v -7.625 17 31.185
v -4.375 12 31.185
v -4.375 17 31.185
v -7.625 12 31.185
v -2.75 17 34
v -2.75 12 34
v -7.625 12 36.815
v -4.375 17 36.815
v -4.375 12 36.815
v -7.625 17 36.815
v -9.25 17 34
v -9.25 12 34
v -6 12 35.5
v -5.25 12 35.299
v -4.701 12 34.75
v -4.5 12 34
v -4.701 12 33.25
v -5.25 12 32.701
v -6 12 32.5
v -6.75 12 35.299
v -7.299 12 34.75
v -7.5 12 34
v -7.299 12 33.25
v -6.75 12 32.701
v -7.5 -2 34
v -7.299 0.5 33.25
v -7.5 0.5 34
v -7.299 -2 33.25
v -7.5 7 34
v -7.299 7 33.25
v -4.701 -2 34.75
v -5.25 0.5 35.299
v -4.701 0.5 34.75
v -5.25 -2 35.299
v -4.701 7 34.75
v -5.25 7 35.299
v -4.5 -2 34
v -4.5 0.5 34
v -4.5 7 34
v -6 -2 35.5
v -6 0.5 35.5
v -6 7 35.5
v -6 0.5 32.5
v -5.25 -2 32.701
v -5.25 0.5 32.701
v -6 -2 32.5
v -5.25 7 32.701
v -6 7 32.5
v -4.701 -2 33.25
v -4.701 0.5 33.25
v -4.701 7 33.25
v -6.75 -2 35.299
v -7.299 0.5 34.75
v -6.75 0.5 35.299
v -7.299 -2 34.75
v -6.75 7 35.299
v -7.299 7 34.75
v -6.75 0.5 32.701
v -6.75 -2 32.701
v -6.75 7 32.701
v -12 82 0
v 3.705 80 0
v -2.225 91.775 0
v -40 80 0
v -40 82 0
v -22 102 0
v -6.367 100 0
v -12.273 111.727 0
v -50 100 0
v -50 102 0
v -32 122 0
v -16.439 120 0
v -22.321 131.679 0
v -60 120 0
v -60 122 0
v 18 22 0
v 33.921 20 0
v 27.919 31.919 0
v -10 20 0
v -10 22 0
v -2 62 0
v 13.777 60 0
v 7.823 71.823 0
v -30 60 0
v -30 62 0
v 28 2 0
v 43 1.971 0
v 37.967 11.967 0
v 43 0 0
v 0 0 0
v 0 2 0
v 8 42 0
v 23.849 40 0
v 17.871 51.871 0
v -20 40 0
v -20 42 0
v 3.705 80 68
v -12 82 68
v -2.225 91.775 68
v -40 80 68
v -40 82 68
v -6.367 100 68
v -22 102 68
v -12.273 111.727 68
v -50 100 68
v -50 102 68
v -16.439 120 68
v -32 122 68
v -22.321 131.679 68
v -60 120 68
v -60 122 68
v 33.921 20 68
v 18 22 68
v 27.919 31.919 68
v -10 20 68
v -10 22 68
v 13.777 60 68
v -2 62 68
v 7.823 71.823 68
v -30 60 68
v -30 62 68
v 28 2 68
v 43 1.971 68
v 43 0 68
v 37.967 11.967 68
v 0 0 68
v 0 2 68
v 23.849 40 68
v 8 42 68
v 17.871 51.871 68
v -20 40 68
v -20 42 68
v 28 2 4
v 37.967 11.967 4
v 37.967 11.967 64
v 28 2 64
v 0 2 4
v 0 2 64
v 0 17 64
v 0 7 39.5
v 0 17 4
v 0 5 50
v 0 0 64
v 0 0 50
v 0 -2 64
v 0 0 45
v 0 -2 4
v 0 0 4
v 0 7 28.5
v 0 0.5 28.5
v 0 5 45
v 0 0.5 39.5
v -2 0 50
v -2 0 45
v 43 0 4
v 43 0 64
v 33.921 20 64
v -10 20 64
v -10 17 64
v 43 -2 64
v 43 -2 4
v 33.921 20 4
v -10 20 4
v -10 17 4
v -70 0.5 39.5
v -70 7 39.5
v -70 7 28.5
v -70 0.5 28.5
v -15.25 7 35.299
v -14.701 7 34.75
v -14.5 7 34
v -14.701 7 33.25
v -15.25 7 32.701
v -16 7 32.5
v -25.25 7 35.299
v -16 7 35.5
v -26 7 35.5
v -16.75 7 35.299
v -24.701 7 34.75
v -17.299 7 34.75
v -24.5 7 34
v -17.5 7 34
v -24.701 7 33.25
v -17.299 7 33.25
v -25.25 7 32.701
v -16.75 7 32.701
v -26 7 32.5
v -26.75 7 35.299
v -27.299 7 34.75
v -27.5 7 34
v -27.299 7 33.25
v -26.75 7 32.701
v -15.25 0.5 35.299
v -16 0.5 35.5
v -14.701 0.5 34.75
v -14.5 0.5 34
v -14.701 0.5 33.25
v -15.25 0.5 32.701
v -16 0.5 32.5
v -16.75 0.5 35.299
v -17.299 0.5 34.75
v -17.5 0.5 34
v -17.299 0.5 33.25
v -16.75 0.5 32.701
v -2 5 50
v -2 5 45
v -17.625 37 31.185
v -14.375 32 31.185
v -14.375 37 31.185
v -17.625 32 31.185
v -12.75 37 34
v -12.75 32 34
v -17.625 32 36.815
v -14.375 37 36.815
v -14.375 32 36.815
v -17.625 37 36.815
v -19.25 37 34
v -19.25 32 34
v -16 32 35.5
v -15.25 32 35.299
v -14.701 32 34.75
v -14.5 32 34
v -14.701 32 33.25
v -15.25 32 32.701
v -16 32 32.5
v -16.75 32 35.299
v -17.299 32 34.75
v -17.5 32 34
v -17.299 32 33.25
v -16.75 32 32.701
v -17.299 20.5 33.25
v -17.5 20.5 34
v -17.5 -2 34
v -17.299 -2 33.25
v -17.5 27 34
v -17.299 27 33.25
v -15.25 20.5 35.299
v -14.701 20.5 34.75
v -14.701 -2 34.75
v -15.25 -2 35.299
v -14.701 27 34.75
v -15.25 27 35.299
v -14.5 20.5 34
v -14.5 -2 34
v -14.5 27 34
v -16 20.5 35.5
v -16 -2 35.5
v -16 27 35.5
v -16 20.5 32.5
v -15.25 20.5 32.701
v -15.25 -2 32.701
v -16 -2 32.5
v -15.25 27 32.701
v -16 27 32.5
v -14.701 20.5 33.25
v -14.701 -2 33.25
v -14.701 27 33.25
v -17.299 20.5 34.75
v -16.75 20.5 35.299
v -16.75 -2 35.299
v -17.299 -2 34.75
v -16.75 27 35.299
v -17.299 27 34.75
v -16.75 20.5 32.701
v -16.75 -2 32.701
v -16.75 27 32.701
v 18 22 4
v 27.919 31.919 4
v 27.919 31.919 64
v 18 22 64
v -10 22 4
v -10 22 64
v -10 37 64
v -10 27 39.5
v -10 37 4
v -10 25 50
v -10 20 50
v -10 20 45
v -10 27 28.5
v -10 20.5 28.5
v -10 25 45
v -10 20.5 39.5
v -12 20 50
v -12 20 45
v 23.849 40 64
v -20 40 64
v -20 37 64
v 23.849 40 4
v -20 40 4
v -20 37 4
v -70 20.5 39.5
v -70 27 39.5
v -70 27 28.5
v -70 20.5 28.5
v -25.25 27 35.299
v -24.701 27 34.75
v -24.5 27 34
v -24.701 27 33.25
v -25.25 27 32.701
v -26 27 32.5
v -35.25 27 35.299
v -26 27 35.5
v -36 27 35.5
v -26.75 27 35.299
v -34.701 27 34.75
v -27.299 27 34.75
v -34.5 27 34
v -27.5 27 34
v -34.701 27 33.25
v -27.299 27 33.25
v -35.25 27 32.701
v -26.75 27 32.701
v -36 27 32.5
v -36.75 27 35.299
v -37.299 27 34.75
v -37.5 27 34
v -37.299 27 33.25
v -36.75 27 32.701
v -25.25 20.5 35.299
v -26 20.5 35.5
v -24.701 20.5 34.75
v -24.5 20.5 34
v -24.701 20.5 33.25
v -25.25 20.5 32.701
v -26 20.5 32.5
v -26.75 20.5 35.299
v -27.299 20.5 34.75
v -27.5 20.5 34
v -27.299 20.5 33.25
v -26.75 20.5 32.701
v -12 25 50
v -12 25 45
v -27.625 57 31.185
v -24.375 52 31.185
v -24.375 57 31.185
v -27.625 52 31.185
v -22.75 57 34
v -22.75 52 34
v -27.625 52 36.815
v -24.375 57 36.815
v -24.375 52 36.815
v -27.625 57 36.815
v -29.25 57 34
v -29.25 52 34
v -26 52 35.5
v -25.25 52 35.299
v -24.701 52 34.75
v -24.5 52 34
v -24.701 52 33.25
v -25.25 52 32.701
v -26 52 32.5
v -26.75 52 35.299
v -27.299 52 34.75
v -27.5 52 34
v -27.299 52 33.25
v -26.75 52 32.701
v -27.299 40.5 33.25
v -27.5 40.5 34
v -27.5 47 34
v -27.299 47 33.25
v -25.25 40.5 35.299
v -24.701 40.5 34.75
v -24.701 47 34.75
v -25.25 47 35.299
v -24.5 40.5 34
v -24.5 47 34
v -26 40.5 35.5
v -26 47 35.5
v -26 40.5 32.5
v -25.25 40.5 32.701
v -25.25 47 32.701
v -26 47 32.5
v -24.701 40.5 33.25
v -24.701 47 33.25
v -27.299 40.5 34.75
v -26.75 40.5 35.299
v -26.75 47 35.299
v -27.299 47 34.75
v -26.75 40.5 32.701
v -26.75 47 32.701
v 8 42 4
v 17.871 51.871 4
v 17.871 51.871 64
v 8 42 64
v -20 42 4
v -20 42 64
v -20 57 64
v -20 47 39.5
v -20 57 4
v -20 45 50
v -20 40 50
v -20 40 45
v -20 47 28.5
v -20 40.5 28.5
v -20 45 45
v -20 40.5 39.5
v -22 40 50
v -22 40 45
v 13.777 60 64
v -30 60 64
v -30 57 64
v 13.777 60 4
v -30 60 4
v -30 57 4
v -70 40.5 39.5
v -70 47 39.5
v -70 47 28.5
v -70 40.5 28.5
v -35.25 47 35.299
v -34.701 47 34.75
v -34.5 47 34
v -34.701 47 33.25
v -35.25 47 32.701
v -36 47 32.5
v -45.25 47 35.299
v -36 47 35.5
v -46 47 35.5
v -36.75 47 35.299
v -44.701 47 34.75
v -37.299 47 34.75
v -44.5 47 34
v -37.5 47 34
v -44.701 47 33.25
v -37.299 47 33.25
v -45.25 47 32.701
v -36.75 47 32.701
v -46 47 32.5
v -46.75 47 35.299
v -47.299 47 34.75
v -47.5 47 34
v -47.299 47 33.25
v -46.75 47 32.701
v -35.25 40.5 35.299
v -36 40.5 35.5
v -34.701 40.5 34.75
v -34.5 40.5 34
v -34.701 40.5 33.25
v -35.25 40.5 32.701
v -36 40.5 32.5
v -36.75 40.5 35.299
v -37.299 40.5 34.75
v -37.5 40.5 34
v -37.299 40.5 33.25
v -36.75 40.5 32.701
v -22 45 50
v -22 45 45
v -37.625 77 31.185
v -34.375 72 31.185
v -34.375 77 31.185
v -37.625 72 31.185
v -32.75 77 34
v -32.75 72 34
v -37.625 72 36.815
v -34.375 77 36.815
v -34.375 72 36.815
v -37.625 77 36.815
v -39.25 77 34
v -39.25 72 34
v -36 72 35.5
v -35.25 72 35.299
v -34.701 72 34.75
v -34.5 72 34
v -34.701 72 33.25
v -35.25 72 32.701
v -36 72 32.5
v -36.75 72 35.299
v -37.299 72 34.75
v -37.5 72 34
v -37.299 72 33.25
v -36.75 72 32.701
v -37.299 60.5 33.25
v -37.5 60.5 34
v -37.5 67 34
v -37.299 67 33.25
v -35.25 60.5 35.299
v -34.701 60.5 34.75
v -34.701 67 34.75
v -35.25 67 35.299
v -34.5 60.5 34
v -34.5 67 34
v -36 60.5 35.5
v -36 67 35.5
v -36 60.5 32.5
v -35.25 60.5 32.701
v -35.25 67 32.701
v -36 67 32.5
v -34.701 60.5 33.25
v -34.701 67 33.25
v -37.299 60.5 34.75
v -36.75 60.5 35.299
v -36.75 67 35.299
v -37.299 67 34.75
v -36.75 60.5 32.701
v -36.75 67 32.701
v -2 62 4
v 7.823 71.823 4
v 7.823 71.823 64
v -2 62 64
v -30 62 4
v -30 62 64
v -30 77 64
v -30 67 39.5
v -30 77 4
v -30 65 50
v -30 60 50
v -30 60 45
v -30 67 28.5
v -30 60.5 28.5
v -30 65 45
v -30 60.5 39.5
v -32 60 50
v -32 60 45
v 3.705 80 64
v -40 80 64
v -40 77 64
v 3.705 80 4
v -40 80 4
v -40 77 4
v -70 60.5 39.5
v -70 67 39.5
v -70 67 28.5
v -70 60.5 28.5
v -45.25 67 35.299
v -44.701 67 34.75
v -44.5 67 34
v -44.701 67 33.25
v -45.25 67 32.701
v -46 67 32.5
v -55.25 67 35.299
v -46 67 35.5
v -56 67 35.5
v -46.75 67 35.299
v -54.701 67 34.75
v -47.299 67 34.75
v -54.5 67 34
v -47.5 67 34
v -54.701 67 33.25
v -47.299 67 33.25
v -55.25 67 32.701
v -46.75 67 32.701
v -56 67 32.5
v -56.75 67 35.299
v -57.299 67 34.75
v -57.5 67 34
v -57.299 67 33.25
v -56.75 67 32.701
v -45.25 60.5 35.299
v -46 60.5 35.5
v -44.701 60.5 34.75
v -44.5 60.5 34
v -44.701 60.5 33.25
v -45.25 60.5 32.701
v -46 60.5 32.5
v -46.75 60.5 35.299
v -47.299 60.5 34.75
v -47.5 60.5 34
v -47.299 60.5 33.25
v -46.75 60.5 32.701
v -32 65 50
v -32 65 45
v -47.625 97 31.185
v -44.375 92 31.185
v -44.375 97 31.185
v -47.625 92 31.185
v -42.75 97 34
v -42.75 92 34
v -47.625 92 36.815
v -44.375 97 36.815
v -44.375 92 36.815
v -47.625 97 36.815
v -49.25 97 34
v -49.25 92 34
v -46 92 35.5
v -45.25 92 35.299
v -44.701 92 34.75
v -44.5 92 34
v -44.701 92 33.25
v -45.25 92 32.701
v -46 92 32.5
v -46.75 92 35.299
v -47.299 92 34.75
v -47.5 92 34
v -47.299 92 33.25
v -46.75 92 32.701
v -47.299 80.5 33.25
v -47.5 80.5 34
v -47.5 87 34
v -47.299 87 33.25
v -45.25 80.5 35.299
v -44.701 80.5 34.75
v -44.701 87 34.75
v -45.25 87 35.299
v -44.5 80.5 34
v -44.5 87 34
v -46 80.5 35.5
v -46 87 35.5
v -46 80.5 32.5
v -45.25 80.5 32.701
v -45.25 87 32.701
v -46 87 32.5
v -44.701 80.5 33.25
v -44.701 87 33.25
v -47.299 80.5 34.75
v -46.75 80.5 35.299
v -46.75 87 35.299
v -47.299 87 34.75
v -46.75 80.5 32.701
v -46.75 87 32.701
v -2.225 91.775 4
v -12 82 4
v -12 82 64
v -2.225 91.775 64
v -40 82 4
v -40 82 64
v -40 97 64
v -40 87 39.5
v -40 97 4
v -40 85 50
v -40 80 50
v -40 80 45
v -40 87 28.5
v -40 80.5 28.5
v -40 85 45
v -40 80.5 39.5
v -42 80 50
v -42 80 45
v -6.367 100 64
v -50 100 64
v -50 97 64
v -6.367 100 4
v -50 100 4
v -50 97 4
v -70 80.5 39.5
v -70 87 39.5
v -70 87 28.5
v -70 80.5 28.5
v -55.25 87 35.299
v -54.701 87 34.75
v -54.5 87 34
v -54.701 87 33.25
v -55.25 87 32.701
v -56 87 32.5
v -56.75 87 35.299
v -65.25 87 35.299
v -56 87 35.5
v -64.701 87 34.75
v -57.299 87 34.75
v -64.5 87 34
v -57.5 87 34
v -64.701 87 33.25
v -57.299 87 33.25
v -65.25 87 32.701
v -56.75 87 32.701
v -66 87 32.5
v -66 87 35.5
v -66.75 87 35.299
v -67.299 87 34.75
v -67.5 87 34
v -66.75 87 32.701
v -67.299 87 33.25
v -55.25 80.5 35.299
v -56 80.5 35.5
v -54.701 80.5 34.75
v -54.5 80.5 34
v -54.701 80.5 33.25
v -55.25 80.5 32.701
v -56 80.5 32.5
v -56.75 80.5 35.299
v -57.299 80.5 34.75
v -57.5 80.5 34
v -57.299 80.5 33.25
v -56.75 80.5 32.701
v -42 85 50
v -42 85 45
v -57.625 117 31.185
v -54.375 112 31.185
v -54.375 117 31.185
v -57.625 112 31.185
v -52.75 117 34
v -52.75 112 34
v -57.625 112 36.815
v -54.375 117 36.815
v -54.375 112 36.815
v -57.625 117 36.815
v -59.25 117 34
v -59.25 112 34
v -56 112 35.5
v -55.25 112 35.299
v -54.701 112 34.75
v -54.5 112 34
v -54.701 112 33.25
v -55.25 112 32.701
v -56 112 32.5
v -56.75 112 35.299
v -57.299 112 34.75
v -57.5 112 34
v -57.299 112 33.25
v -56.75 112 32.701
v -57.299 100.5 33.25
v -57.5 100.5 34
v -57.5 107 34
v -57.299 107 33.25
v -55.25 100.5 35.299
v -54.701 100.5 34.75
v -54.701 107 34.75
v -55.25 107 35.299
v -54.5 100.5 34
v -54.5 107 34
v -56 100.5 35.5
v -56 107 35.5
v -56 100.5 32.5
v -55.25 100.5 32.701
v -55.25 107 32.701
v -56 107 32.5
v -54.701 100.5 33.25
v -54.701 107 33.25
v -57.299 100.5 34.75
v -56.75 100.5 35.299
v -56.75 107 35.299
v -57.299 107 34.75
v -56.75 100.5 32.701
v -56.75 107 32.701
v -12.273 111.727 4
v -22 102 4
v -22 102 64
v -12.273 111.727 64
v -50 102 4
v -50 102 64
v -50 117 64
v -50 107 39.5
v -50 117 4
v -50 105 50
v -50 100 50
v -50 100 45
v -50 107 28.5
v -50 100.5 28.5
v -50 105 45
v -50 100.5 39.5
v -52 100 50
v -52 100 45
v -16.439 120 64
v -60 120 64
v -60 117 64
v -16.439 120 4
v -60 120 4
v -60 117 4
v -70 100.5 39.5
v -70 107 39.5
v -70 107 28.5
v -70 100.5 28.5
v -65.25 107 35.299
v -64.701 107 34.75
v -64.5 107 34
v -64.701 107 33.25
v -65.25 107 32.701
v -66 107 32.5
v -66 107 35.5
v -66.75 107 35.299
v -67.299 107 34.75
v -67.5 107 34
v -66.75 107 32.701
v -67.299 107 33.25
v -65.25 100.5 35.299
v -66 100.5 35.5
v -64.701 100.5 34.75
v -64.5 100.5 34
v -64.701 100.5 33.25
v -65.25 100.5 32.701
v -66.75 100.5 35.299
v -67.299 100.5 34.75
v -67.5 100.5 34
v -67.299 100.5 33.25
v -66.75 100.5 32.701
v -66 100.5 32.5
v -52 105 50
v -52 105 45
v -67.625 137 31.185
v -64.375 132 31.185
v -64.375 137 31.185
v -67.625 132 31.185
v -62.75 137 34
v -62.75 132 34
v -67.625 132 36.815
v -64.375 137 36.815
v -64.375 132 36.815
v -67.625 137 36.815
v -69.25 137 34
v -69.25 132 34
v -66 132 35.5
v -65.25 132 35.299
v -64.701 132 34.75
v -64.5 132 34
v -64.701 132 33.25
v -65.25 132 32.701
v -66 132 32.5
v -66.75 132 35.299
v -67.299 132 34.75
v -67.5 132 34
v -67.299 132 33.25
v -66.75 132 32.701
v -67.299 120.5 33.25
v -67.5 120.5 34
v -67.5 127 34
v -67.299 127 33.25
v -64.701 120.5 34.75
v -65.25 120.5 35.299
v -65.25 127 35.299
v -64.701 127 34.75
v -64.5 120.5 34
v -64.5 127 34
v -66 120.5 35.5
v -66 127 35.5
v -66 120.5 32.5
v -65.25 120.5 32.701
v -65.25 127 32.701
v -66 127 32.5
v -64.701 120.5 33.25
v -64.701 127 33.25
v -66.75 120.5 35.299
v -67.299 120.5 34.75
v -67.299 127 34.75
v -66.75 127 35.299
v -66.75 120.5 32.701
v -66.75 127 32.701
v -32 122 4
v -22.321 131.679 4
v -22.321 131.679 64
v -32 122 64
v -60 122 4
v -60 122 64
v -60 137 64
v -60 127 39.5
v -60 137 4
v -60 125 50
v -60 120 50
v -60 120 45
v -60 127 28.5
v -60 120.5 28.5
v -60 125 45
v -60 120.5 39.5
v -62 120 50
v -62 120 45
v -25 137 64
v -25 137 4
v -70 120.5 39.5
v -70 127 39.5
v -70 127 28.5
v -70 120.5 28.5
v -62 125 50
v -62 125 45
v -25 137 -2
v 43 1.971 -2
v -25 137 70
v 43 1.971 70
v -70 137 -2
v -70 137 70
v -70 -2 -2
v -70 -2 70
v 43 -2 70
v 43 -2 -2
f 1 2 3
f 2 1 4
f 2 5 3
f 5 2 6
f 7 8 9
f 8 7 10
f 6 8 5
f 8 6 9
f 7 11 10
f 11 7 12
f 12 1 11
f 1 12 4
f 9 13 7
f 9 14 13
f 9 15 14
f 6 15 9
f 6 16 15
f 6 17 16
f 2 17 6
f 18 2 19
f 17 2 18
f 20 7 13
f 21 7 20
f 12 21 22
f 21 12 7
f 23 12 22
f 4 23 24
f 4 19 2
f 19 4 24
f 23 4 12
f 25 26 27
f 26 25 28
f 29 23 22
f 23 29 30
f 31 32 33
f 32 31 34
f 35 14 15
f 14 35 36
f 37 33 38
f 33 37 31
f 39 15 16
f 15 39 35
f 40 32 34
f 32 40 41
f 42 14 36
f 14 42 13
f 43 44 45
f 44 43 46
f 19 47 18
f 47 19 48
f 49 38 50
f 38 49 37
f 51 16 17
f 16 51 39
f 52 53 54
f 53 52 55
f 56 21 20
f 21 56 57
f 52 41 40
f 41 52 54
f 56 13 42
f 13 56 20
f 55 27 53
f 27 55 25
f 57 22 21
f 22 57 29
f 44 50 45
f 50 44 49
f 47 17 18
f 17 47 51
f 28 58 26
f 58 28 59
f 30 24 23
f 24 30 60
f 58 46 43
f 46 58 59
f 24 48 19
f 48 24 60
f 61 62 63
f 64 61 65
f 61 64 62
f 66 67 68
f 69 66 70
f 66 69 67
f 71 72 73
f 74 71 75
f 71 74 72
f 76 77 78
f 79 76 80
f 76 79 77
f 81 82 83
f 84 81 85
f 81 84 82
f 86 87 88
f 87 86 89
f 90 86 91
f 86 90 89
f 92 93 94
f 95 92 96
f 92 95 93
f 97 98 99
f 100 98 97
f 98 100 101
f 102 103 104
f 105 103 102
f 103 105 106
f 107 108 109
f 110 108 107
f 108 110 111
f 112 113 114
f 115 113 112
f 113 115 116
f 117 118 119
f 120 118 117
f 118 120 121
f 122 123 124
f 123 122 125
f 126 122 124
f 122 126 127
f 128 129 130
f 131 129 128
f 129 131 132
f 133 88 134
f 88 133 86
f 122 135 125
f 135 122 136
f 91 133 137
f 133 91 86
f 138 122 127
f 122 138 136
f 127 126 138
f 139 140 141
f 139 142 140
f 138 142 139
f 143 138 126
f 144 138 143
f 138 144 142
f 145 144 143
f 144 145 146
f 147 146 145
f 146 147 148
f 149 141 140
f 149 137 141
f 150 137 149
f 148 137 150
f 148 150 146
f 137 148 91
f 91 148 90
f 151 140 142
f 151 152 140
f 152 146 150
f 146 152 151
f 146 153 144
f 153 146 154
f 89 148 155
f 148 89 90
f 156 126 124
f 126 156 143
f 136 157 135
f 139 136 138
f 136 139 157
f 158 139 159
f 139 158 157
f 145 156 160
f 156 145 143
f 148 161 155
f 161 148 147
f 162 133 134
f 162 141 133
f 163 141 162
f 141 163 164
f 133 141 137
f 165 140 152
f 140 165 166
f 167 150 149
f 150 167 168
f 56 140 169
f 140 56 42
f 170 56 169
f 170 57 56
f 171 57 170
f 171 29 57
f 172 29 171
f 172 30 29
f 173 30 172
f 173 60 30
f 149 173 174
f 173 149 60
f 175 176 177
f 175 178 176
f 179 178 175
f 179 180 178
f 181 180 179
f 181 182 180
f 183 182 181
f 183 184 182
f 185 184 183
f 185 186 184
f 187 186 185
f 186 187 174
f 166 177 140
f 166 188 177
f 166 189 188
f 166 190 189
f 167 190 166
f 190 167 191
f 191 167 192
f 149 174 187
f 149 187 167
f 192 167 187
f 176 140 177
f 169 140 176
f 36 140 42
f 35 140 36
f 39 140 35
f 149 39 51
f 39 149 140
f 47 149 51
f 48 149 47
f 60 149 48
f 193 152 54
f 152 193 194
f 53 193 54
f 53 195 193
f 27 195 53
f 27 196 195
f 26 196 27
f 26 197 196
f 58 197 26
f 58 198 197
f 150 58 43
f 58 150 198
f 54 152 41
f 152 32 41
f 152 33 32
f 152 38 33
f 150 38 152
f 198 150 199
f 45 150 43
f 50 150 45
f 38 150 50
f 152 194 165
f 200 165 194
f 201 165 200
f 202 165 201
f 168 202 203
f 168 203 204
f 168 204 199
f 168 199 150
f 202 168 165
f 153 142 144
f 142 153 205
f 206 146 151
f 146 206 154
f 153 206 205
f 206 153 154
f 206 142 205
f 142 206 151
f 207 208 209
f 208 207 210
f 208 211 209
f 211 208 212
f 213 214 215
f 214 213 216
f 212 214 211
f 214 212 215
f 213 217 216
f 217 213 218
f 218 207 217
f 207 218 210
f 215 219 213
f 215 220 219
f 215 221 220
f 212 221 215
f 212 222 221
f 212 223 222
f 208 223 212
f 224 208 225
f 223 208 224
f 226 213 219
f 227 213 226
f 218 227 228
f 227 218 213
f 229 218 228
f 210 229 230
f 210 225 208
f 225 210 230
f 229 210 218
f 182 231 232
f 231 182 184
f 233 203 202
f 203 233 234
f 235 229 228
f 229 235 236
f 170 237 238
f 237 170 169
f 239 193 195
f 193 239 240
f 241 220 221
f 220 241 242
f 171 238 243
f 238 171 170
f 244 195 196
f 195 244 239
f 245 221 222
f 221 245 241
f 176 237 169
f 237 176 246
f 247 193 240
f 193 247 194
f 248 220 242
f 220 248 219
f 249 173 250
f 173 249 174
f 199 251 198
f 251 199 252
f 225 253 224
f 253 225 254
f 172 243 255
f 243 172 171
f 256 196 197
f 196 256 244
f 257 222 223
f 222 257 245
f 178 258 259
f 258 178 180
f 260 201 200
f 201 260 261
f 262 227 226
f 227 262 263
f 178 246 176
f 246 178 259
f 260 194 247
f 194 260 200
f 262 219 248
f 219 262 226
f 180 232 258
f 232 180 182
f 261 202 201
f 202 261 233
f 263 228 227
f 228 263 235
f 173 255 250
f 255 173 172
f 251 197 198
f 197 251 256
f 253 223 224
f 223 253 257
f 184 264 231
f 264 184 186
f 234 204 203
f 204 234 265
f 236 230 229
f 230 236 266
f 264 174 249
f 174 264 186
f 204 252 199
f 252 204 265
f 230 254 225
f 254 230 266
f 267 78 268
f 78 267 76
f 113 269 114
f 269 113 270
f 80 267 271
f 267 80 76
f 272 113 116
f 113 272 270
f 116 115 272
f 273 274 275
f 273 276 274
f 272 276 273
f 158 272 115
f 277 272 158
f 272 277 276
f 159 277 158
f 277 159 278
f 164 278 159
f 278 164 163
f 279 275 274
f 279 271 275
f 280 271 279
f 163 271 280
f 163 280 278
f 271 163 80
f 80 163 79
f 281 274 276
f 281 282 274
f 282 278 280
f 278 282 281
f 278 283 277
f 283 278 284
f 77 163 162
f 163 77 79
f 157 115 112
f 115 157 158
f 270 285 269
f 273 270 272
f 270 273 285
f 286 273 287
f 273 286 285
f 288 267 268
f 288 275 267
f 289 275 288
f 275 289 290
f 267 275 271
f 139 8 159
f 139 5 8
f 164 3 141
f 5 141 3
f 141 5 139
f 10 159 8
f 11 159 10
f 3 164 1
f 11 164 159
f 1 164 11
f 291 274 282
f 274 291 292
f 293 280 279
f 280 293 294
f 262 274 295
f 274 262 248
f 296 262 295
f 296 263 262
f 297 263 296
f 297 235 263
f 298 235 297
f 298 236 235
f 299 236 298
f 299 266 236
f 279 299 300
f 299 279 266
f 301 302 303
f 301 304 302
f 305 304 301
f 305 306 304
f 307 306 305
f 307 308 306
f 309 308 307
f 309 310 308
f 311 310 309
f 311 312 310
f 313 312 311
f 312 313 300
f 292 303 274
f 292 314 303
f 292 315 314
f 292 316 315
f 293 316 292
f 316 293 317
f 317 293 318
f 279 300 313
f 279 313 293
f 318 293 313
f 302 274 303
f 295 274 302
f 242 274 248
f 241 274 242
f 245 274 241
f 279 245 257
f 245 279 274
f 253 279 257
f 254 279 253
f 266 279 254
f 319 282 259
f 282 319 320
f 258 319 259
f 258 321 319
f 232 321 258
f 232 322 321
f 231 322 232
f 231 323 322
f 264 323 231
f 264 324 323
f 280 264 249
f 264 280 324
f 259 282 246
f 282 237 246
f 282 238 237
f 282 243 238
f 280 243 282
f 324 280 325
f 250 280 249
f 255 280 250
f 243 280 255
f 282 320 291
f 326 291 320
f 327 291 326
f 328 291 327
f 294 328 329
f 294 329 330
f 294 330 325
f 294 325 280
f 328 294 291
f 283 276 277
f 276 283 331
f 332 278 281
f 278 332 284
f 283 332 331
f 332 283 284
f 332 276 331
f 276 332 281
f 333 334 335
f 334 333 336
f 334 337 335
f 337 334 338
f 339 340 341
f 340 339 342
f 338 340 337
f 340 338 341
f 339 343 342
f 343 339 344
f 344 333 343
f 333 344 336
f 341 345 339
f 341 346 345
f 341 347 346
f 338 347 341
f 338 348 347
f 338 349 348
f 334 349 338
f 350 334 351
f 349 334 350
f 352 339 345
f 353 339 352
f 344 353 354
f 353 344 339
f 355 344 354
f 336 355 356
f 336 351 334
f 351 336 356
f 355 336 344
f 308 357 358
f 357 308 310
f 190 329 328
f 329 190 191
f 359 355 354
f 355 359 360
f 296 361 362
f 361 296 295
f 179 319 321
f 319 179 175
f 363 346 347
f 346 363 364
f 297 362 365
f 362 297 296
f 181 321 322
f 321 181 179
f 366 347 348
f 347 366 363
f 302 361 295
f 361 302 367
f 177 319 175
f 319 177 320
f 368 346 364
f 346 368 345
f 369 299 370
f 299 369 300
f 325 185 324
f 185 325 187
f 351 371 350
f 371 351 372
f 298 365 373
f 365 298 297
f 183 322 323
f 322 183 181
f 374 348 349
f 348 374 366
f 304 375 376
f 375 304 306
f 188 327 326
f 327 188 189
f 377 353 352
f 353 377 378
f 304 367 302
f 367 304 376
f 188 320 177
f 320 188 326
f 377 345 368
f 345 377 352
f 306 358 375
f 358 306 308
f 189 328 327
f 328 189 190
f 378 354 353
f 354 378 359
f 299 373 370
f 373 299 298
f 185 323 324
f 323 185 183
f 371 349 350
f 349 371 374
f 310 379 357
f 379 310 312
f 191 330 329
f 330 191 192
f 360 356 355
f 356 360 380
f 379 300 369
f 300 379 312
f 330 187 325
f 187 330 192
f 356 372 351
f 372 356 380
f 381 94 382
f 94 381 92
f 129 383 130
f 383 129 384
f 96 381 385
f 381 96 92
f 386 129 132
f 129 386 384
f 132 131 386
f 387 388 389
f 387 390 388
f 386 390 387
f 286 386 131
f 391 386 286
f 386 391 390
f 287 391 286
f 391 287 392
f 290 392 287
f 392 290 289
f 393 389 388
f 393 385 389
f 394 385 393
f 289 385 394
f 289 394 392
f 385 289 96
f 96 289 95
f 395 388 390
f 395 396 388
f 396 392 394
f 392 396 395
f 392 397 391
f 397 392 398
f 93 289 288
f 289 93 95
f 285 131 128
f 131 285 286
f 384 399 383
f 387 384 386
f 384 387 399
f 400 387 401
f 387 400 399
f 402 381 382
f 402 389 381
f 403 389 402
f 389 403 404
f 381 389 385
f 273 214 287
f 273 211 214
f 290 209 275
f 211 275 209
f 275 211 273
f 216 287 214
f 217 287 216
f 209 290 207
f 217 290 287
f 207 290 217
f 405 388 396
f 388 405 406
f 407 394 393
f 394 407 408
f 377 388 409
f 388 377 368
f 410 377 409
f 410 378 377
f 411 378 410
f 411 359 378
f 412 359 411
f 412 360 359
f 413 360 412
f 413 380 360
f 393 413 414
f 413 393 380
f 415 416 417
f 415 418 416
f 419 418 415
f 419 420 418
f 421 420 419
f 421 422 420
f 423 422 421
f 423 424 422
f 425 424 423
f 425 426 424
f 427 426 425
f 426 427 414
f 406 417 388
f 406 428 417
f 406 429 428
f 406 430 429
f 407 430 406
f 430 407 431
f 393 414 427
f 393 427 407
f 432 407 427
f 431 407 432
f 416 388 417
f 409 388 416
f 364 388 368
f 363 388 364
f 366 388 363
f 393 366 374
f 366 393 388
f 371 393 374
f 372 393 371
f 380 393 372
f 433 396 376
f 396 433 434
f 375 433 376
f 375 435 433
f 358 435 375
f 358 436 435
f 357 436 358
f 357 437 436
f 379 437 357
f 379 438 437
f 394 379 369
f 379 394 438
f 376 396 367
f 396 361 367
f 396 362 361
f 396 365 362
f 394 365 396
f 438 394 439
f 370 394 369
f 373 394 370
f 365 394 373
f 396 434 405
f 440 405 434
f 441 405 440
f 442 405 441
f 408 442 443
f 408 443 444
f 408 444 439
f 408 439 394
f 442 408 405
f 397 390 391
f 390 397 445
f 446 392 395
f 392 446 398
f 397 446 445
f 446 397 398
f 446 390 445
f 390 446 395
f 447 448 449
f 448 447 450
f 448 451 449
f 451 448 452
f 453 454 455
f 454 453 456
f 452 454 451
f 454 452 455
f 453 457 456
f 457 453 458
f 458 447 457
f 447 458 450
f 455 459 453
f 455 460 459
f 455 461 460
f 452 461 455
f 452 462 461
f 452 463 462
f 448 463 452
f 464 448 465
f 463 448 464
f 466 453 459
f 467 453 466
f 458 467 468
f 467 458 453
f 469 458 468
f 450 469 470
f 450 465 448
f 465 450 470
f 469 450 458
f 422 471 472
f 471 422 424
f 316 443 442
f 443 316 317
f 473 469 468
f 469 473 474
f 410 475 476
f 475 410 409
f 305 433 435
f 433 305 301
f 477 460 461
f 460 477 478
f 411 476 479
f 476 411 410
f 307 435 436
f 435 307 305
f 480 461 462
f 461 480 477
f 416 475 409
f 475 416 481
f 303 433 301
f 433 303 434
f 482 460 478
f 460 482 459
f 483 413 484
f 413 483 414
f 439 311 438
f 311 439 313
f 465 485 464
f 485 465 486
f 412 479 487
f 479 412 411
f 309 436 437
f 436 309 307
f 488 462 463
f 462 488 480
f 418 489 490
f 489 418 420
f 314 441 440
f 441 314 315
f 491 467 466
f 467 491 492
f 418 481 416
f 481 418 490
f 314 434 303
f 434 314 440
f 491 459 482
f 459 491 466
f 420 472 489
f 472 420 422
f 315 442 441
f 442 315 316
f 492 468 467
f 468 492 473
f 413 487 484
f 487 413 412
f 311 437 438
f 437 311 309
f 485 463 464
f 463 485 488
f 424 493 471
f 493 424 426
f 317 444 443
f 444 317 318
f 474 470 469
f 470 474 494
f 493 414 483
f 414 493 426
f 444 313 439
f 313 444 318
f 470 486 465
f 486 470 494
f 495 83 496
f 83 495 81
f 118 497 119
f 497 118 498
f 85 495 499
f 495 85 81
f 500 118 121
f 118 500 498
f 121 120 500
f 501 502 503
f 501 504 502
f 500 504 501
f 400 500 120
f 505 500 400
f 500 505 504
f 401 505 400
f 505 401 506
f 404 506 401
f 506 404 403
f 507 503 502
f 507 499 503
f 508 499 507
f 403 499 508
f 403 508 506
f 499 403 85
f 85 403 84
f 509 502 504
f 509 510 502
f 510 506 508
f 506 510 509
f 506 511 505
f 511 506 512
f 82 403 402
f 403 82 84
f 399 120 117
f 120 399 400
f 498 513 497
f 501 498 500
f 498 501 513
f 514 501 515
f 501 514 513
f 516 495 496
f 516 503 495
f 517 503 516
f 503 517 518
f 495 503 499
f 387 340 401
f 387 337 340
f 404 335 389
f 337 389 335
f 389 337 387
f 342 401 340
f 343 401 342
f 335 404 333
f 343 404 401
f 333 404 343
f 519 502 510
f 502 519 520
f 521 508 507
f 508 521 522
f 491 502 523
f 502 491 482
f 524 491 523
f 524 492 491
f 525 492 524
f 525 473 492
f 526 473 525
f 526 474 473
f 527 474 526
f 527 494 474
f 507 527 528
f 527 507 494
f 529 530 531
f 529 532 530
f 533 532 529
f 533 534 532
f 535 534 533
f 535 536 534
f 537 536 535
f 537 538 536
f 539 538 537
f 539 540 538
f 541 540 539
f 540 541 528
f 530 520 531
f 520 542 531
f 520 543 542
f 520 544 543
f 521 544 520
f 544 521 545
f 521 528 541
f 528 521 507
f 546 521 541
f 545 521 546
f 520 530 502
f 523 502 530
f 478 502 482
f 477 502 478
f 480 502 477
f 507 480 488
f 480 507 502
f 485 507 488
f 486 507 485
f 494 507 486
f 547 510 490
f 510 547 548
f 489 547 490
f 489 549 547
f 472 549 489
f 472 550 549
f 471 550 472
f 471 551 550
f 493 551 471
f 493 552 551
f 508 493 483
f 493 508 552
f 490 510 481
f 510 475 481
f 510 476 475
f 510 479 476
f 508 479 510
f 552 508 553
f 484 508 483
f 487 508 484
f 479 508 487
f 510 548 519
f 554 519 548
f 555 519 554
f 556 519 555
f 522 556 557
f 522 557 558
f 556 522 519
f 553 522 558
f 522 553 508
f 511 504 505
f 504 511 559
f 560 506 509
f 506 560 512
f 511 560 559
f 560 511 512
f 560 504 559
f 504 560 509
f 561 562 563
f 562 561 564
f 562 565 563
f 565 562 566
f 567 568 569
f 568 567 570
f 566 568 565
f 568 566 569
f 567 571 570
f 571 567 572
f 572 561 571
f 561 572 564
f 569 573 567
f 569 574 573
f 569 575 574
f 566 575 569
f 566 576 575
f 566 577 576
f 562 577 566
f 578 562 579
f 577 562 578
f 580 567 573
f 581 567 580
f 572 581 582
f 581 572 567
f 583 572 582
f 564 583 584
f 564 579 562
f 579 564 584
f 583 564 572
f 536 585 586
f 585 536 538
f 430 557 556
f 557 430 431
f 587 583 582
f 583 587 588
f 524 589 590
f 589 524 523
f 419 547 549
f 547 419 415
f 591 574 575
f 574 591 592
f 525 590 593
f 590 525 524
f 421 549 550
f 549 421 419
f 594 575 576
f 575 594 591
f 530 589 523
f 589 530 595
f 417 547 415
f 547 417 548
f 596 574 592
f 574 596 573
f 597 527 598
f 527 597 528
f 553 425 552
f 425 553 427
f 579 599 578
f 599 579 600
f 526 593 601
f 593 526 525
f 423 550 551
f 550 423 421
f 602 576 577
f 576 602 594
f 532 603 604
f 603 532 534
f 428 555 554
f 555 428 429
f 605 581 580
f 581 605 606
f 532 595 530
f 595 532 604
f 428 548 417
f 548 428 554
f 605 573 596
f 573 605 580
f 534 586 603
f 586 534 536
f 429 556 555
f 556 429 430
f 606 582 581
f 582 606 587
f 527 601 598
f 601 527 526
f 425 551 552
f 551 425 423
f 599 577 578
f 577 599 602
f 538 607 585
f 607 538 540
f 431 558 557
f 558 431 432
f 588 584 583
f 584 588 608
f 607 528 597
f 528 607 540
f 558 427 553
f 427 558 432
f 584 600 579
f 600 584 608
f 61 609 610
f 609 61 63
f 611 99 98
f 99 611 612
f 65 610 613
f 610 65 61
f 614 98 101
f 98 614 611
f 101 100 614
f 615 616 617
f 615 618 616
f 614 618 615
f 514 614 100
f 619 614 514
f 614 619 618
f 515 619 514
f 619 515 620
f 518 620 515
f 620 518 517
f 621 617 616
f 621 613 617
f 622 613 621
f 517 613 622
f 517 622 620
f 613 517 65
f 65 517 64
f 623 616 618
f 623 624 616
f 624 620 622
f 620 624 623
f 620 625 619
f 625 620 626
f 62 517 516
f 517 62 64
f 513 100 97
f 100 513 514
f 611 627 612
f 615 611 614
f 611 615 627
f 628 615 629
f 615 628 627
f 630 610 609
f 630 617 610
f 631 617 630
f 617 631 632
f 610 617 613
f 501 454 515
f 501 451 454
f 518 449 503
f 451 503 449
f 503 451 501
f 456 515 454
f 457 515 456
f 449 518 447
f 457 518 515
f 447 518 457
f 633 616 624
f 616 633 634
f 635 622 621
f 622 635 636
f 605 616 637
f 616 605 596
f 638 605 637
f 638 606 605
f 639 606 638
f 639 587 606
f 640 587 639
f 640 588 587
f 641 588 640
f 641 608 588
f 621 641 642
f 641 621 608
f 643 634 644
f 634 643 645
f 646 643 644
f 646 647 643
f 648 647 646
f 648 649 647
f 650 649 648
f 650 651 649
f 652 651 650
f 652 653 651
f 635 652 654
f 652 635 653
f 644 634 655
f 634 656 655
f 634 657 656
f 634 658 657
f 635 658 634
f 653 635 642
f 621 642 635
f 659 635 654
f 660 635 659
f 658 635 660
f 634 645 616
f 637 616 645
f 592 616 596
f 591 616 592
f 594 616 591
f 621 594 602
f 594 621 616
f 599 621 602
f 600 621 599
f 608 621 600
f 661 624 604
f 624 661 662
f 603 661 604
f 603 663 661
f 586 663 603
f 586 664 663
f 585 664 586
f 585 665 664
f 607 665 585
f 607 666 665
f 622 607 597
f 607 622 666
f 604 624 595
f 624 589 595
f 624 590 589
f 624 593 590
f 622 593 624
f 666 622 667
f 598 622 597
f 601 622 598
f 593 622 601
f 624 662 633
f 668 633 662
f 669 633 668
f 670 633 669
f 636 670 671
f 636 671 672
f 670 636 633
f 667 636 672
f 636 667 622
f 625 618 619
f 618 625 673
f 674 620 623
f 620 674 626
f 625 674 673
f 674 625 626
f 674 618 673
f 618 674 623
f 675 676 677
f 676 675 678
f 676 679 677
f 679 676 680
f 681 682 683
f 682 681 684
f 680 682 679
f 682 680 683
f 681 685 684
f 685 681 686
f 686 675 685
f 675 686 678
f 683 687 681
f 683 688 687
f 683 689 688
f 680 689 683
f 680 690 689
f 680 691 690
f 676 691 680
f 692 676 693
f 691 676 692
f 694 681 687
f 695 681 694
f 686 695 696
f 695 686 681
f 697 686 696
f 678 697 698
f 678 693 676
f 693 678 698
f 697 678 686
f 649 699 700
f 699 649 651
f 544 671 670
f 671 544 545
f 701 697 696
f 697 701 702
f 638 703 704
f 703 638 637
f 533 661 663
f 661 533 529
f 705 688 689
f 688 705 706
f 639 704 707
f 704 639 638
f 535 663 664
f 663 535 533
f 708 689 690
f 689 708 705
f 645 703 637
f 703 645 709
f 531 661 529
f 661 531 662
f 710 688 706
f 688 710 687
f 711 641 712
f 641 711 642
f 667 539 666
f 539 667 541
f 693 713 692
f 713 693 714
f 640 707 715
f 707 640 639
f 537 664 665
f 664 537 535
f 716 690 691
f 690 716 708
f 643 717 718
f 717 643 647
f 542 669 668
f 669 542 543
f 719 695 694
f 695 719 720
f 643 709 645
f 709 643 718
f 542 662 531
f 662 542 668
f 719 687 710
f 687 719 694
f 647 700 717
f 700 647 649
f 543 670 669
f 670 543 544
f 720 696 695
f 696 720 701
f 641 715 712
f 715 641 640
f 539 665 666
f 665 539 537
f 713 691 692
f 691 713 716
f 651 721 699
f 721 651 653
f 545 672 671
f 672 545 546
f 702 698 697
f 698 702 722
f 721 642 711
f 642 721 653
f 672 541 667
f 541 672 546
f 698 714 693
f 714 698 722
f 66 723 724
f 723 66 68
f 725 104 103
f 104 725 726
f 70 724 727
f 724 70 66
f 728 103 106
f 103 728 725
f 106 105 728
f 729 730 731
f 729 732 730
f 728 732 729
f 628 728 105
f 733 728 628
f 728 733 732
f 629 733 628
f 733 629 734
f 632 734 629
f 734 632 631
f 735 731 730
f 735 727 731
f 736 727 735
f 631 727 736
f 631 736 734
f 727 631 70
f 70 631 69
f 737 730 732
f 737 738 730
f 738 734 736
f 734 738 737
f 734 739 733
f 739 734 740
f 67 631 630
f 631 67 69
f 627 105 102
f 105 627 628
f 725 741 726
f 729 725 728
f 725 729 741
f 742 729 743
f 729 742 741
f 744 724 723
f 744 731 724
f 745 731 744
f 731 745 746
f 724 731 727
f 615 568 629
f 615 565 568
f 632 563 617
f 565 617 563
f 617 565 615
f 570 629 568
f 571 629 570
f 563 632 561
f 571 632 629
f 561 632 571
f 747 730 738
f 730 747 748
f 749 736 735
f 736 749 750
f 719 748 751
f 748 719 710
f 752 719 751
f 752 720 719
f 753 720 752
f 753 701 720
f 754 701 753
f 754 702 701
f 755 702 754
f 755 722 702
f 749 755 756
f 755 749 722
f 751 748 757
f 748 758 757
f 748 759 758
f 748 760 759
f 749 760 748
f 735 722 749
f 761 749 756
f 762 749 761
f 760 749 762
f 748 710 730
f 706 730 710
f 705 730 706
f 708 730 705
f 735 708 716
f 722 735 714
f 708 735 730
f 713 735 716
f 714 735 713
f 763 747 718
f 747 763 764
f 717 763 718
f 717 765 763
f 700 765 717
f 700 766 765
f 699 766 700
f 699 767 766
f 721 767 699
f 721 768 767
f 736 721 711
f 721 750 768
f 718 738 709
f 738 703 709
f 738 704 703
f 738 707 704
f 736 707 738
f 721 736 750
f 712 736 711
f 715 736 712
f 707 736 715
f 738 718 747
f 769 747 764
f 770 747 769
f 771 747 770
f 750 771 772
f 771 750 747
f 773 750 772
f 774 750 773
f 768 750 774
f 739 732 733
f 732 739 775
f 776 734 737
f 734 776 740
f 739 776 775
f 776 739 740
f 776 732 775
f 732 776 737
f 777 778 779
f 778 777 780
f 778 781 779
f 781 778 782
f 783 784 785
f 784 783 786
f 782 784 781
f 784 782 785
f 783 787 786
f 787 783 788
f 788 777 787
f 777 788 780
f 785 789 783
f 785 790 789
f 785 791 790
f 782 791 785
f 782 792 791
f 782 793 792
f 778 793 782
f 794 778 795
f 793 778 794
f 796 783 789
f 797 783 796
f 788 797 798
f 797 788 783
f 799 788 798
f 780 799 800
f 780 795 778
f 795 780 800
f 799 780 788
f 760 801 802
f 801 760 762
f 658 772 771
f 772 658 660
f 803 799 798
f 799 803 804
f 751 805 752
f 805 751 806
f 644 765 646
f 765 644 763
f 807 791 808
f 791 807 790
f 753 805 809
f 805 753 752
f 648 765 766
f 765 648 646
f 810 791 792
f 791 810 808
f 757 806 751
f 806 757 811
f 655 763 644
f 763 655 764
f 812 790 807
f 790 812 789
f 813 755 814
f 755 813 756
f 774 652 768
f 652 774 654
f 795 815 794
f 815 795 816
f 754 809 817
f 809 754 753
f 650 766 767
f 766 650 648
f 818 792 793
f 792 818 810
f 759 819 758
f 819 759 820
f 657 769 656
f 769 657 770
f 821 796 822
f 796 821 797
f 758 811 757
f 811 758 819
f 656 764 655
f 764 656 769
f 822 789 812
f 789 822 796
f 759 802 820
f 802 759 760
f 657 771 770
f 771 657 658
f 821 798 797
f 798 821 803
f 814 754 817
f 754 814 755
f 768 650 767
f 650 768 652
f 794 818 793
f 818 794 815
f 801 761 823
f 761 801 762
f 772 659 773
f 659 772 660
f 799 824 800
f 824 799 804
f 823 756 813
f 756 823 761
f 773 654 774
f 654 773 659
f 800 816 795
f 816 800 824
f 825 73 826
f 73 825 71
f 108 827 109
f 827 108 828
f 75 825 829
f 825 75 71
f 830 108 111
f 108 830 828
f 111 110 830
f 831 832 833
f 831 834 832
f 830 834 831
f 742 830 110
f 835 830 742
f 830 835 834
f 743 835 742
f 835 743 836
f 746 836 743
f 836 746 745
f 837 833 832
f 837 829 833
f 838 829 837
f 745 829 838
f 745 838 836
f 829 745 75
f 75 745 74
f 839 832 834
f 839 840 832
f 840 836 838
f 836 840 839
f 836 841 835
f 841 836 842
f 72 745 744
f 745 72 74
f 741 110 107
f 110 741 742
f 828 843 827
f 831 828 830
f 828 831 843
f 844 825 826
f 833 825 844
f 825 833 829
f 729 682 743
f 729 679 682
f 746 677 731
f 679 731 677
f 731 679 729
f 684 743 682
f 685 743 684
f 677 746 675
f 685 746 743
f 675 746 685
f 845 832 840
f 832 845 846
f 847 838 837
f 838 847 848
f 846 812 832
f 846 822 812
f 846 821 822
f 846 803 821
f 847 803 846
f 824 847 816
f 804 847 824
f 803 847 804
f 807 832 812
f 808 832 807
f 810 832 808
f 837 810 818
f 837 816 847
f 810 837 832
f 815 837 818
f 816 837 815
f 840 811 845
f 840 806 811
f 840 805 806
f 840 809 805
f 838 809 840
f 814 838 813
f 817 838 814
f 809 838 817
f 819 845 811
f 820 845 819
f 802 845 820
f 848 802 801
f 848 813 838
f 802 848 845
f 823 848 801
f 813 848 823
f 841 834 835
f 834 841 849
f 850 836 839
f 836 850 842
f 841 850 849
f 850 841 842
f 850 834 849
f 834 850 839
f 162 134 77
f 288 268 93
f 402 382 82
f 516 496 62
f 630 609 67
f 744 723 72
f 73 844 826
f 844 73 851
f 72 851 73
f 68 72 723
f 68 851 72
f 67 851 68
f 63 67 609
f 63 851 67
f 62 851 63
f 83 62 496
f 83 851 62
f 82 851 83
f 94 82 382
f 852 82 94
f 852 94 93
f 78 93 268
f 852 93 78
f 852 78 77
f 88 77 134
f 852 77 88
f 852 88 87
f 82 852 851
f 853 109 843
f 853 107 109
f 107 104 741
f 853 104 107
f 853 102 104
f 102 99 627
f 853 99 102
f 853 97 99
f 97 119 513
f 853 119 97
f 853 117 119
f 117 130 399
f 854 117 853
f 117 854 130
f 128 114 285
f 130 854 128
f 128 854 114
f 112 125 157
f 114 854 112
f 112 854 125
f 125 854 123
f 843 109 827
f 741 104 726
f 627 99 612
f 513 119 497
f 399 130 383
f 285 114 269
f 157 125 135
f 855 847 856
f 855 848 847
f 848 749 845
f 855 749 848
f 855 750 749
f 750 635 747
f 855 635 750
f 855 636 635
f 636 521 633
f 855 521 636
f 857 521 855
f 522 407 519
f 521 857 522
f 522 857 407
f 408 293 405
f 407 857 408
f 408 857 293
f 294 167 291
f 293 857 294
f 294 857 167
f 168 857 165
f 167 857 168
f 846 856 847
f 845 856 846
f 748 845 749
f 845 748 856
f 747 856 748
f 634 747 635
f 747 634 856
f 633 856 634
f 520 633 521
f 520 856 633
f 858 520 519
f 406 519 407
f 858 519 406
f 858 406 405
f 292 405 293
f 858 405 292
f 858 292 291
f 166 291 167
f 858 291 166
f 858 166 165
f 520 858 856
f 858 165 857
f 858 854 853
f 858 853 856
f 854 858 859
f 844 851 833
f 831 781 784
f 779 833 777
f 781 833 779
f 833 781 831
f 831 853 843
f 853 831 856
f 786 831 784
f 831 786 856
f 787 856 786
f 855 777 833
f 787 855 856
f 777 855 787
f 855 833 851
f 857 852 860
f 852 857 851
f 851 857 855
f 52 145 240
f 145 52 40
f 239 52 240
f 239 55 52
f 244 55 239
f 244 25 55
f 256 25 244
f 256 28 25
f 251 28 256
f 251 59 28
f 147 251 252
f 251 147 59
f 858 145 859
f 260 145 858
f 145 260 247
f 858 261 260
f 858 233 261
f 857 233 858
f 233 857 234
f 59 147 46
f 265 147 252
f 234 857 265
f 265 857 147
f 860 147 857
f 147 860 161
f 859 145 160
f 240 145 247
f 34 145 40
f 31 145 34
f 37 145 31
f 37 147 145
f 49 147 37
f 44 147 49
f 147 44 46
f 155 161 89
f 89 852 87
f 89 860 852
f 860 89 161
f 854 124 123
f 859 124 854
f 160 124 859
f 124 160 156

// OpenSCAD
/* badge programming dock
right now, only a few parameters for making a multi-dock
can be mounted with M.3 screws and bolts
USB held in place with M.2 set screw

todo: more parameters; upright orientation; badge origin at usb port; dock base at z=0; round corners
*/

xpitch=10;
ypitch=20;
zpitch=70;
rows=7;
cols=1;
//wall_thickness=2
//badgex=
//badgey=
//badgez=

module badge(){
    union(){
        //pcb edge track
        linear_extrude(68)
        polygon(points=[
        [0,0],
        [126,0],
        [126,100],
        [28,2],
        [0,2]
        ]);
        //battery cutout
        translate([0,-3,4])
            cube([126,23,60]);        
        //usb port
        translate([-80,0.5,34-5.5])
            cube([80,6.5,11]);
        //power switch
        translate([-2,0,45])
            cube([2,5,5]);
        //usb set screw
        screwhole([-6,15,34],[90,0,0],6.5,3);
        //mounting holes
//        screwholes();
        }
}

module badgearray(rows=1,cols=1){
  for (i=[0:rows-1])
    for (j=[0:cols-1])
      translate([-i*xpitch,i*ypitch,j*zpitch])
    badge();
}

module screwhole(origin,orientation,d1=7,d2=4){
  translate(origin)
    rotate(orientation){
      //larger hex inset hole for head/bolt
      cylinder(h=6, d=d1,center=true,$fn=6);
      //smaller hole for shaft
      cylinder(h=100, d=d2,center=true,$fn=12);
    }
}

module screwholes(){
    //bottom
    screwhole([0,10,14],[0,90,0]);
    screwhole([0,10,68-14],[0,90,0]);
    //left
    screwhole([25,10,4],[0,0,0]);
    screwhole([5,10,4],[0,0,0]);
    //right
    screwhole([25,10,64],[0,0,0]);
    screwhole([5,10,64],[0,0,0]);
}

module multibadgedock(rows=1,cols=1){
  difference(){
    union(){
      translate([0,-2,-2])
        linear_extrude(zpitch*cols+2)
          polygon(points=[
            [45,0],
            [-rows*xpitch,0],
            [-rows*xpitch,ypitch*rows-1],
            [45-rows*xpitch,ypitch*rows-1]
          ]);
    }
    //carve out the badges
    badgearray(rows,cols);
    //clip the pointy top
    translate([43,-2,-2])cube([10,10,zpitch*cols+4]);
  }
}

single=true;
single=false;
dock=true;
//dock=false;

if (single){rows=1;cols=1;}
if (dock){
    multibadgedock(rows,cols);
}else{
    badgearray(rows,cols);
}
